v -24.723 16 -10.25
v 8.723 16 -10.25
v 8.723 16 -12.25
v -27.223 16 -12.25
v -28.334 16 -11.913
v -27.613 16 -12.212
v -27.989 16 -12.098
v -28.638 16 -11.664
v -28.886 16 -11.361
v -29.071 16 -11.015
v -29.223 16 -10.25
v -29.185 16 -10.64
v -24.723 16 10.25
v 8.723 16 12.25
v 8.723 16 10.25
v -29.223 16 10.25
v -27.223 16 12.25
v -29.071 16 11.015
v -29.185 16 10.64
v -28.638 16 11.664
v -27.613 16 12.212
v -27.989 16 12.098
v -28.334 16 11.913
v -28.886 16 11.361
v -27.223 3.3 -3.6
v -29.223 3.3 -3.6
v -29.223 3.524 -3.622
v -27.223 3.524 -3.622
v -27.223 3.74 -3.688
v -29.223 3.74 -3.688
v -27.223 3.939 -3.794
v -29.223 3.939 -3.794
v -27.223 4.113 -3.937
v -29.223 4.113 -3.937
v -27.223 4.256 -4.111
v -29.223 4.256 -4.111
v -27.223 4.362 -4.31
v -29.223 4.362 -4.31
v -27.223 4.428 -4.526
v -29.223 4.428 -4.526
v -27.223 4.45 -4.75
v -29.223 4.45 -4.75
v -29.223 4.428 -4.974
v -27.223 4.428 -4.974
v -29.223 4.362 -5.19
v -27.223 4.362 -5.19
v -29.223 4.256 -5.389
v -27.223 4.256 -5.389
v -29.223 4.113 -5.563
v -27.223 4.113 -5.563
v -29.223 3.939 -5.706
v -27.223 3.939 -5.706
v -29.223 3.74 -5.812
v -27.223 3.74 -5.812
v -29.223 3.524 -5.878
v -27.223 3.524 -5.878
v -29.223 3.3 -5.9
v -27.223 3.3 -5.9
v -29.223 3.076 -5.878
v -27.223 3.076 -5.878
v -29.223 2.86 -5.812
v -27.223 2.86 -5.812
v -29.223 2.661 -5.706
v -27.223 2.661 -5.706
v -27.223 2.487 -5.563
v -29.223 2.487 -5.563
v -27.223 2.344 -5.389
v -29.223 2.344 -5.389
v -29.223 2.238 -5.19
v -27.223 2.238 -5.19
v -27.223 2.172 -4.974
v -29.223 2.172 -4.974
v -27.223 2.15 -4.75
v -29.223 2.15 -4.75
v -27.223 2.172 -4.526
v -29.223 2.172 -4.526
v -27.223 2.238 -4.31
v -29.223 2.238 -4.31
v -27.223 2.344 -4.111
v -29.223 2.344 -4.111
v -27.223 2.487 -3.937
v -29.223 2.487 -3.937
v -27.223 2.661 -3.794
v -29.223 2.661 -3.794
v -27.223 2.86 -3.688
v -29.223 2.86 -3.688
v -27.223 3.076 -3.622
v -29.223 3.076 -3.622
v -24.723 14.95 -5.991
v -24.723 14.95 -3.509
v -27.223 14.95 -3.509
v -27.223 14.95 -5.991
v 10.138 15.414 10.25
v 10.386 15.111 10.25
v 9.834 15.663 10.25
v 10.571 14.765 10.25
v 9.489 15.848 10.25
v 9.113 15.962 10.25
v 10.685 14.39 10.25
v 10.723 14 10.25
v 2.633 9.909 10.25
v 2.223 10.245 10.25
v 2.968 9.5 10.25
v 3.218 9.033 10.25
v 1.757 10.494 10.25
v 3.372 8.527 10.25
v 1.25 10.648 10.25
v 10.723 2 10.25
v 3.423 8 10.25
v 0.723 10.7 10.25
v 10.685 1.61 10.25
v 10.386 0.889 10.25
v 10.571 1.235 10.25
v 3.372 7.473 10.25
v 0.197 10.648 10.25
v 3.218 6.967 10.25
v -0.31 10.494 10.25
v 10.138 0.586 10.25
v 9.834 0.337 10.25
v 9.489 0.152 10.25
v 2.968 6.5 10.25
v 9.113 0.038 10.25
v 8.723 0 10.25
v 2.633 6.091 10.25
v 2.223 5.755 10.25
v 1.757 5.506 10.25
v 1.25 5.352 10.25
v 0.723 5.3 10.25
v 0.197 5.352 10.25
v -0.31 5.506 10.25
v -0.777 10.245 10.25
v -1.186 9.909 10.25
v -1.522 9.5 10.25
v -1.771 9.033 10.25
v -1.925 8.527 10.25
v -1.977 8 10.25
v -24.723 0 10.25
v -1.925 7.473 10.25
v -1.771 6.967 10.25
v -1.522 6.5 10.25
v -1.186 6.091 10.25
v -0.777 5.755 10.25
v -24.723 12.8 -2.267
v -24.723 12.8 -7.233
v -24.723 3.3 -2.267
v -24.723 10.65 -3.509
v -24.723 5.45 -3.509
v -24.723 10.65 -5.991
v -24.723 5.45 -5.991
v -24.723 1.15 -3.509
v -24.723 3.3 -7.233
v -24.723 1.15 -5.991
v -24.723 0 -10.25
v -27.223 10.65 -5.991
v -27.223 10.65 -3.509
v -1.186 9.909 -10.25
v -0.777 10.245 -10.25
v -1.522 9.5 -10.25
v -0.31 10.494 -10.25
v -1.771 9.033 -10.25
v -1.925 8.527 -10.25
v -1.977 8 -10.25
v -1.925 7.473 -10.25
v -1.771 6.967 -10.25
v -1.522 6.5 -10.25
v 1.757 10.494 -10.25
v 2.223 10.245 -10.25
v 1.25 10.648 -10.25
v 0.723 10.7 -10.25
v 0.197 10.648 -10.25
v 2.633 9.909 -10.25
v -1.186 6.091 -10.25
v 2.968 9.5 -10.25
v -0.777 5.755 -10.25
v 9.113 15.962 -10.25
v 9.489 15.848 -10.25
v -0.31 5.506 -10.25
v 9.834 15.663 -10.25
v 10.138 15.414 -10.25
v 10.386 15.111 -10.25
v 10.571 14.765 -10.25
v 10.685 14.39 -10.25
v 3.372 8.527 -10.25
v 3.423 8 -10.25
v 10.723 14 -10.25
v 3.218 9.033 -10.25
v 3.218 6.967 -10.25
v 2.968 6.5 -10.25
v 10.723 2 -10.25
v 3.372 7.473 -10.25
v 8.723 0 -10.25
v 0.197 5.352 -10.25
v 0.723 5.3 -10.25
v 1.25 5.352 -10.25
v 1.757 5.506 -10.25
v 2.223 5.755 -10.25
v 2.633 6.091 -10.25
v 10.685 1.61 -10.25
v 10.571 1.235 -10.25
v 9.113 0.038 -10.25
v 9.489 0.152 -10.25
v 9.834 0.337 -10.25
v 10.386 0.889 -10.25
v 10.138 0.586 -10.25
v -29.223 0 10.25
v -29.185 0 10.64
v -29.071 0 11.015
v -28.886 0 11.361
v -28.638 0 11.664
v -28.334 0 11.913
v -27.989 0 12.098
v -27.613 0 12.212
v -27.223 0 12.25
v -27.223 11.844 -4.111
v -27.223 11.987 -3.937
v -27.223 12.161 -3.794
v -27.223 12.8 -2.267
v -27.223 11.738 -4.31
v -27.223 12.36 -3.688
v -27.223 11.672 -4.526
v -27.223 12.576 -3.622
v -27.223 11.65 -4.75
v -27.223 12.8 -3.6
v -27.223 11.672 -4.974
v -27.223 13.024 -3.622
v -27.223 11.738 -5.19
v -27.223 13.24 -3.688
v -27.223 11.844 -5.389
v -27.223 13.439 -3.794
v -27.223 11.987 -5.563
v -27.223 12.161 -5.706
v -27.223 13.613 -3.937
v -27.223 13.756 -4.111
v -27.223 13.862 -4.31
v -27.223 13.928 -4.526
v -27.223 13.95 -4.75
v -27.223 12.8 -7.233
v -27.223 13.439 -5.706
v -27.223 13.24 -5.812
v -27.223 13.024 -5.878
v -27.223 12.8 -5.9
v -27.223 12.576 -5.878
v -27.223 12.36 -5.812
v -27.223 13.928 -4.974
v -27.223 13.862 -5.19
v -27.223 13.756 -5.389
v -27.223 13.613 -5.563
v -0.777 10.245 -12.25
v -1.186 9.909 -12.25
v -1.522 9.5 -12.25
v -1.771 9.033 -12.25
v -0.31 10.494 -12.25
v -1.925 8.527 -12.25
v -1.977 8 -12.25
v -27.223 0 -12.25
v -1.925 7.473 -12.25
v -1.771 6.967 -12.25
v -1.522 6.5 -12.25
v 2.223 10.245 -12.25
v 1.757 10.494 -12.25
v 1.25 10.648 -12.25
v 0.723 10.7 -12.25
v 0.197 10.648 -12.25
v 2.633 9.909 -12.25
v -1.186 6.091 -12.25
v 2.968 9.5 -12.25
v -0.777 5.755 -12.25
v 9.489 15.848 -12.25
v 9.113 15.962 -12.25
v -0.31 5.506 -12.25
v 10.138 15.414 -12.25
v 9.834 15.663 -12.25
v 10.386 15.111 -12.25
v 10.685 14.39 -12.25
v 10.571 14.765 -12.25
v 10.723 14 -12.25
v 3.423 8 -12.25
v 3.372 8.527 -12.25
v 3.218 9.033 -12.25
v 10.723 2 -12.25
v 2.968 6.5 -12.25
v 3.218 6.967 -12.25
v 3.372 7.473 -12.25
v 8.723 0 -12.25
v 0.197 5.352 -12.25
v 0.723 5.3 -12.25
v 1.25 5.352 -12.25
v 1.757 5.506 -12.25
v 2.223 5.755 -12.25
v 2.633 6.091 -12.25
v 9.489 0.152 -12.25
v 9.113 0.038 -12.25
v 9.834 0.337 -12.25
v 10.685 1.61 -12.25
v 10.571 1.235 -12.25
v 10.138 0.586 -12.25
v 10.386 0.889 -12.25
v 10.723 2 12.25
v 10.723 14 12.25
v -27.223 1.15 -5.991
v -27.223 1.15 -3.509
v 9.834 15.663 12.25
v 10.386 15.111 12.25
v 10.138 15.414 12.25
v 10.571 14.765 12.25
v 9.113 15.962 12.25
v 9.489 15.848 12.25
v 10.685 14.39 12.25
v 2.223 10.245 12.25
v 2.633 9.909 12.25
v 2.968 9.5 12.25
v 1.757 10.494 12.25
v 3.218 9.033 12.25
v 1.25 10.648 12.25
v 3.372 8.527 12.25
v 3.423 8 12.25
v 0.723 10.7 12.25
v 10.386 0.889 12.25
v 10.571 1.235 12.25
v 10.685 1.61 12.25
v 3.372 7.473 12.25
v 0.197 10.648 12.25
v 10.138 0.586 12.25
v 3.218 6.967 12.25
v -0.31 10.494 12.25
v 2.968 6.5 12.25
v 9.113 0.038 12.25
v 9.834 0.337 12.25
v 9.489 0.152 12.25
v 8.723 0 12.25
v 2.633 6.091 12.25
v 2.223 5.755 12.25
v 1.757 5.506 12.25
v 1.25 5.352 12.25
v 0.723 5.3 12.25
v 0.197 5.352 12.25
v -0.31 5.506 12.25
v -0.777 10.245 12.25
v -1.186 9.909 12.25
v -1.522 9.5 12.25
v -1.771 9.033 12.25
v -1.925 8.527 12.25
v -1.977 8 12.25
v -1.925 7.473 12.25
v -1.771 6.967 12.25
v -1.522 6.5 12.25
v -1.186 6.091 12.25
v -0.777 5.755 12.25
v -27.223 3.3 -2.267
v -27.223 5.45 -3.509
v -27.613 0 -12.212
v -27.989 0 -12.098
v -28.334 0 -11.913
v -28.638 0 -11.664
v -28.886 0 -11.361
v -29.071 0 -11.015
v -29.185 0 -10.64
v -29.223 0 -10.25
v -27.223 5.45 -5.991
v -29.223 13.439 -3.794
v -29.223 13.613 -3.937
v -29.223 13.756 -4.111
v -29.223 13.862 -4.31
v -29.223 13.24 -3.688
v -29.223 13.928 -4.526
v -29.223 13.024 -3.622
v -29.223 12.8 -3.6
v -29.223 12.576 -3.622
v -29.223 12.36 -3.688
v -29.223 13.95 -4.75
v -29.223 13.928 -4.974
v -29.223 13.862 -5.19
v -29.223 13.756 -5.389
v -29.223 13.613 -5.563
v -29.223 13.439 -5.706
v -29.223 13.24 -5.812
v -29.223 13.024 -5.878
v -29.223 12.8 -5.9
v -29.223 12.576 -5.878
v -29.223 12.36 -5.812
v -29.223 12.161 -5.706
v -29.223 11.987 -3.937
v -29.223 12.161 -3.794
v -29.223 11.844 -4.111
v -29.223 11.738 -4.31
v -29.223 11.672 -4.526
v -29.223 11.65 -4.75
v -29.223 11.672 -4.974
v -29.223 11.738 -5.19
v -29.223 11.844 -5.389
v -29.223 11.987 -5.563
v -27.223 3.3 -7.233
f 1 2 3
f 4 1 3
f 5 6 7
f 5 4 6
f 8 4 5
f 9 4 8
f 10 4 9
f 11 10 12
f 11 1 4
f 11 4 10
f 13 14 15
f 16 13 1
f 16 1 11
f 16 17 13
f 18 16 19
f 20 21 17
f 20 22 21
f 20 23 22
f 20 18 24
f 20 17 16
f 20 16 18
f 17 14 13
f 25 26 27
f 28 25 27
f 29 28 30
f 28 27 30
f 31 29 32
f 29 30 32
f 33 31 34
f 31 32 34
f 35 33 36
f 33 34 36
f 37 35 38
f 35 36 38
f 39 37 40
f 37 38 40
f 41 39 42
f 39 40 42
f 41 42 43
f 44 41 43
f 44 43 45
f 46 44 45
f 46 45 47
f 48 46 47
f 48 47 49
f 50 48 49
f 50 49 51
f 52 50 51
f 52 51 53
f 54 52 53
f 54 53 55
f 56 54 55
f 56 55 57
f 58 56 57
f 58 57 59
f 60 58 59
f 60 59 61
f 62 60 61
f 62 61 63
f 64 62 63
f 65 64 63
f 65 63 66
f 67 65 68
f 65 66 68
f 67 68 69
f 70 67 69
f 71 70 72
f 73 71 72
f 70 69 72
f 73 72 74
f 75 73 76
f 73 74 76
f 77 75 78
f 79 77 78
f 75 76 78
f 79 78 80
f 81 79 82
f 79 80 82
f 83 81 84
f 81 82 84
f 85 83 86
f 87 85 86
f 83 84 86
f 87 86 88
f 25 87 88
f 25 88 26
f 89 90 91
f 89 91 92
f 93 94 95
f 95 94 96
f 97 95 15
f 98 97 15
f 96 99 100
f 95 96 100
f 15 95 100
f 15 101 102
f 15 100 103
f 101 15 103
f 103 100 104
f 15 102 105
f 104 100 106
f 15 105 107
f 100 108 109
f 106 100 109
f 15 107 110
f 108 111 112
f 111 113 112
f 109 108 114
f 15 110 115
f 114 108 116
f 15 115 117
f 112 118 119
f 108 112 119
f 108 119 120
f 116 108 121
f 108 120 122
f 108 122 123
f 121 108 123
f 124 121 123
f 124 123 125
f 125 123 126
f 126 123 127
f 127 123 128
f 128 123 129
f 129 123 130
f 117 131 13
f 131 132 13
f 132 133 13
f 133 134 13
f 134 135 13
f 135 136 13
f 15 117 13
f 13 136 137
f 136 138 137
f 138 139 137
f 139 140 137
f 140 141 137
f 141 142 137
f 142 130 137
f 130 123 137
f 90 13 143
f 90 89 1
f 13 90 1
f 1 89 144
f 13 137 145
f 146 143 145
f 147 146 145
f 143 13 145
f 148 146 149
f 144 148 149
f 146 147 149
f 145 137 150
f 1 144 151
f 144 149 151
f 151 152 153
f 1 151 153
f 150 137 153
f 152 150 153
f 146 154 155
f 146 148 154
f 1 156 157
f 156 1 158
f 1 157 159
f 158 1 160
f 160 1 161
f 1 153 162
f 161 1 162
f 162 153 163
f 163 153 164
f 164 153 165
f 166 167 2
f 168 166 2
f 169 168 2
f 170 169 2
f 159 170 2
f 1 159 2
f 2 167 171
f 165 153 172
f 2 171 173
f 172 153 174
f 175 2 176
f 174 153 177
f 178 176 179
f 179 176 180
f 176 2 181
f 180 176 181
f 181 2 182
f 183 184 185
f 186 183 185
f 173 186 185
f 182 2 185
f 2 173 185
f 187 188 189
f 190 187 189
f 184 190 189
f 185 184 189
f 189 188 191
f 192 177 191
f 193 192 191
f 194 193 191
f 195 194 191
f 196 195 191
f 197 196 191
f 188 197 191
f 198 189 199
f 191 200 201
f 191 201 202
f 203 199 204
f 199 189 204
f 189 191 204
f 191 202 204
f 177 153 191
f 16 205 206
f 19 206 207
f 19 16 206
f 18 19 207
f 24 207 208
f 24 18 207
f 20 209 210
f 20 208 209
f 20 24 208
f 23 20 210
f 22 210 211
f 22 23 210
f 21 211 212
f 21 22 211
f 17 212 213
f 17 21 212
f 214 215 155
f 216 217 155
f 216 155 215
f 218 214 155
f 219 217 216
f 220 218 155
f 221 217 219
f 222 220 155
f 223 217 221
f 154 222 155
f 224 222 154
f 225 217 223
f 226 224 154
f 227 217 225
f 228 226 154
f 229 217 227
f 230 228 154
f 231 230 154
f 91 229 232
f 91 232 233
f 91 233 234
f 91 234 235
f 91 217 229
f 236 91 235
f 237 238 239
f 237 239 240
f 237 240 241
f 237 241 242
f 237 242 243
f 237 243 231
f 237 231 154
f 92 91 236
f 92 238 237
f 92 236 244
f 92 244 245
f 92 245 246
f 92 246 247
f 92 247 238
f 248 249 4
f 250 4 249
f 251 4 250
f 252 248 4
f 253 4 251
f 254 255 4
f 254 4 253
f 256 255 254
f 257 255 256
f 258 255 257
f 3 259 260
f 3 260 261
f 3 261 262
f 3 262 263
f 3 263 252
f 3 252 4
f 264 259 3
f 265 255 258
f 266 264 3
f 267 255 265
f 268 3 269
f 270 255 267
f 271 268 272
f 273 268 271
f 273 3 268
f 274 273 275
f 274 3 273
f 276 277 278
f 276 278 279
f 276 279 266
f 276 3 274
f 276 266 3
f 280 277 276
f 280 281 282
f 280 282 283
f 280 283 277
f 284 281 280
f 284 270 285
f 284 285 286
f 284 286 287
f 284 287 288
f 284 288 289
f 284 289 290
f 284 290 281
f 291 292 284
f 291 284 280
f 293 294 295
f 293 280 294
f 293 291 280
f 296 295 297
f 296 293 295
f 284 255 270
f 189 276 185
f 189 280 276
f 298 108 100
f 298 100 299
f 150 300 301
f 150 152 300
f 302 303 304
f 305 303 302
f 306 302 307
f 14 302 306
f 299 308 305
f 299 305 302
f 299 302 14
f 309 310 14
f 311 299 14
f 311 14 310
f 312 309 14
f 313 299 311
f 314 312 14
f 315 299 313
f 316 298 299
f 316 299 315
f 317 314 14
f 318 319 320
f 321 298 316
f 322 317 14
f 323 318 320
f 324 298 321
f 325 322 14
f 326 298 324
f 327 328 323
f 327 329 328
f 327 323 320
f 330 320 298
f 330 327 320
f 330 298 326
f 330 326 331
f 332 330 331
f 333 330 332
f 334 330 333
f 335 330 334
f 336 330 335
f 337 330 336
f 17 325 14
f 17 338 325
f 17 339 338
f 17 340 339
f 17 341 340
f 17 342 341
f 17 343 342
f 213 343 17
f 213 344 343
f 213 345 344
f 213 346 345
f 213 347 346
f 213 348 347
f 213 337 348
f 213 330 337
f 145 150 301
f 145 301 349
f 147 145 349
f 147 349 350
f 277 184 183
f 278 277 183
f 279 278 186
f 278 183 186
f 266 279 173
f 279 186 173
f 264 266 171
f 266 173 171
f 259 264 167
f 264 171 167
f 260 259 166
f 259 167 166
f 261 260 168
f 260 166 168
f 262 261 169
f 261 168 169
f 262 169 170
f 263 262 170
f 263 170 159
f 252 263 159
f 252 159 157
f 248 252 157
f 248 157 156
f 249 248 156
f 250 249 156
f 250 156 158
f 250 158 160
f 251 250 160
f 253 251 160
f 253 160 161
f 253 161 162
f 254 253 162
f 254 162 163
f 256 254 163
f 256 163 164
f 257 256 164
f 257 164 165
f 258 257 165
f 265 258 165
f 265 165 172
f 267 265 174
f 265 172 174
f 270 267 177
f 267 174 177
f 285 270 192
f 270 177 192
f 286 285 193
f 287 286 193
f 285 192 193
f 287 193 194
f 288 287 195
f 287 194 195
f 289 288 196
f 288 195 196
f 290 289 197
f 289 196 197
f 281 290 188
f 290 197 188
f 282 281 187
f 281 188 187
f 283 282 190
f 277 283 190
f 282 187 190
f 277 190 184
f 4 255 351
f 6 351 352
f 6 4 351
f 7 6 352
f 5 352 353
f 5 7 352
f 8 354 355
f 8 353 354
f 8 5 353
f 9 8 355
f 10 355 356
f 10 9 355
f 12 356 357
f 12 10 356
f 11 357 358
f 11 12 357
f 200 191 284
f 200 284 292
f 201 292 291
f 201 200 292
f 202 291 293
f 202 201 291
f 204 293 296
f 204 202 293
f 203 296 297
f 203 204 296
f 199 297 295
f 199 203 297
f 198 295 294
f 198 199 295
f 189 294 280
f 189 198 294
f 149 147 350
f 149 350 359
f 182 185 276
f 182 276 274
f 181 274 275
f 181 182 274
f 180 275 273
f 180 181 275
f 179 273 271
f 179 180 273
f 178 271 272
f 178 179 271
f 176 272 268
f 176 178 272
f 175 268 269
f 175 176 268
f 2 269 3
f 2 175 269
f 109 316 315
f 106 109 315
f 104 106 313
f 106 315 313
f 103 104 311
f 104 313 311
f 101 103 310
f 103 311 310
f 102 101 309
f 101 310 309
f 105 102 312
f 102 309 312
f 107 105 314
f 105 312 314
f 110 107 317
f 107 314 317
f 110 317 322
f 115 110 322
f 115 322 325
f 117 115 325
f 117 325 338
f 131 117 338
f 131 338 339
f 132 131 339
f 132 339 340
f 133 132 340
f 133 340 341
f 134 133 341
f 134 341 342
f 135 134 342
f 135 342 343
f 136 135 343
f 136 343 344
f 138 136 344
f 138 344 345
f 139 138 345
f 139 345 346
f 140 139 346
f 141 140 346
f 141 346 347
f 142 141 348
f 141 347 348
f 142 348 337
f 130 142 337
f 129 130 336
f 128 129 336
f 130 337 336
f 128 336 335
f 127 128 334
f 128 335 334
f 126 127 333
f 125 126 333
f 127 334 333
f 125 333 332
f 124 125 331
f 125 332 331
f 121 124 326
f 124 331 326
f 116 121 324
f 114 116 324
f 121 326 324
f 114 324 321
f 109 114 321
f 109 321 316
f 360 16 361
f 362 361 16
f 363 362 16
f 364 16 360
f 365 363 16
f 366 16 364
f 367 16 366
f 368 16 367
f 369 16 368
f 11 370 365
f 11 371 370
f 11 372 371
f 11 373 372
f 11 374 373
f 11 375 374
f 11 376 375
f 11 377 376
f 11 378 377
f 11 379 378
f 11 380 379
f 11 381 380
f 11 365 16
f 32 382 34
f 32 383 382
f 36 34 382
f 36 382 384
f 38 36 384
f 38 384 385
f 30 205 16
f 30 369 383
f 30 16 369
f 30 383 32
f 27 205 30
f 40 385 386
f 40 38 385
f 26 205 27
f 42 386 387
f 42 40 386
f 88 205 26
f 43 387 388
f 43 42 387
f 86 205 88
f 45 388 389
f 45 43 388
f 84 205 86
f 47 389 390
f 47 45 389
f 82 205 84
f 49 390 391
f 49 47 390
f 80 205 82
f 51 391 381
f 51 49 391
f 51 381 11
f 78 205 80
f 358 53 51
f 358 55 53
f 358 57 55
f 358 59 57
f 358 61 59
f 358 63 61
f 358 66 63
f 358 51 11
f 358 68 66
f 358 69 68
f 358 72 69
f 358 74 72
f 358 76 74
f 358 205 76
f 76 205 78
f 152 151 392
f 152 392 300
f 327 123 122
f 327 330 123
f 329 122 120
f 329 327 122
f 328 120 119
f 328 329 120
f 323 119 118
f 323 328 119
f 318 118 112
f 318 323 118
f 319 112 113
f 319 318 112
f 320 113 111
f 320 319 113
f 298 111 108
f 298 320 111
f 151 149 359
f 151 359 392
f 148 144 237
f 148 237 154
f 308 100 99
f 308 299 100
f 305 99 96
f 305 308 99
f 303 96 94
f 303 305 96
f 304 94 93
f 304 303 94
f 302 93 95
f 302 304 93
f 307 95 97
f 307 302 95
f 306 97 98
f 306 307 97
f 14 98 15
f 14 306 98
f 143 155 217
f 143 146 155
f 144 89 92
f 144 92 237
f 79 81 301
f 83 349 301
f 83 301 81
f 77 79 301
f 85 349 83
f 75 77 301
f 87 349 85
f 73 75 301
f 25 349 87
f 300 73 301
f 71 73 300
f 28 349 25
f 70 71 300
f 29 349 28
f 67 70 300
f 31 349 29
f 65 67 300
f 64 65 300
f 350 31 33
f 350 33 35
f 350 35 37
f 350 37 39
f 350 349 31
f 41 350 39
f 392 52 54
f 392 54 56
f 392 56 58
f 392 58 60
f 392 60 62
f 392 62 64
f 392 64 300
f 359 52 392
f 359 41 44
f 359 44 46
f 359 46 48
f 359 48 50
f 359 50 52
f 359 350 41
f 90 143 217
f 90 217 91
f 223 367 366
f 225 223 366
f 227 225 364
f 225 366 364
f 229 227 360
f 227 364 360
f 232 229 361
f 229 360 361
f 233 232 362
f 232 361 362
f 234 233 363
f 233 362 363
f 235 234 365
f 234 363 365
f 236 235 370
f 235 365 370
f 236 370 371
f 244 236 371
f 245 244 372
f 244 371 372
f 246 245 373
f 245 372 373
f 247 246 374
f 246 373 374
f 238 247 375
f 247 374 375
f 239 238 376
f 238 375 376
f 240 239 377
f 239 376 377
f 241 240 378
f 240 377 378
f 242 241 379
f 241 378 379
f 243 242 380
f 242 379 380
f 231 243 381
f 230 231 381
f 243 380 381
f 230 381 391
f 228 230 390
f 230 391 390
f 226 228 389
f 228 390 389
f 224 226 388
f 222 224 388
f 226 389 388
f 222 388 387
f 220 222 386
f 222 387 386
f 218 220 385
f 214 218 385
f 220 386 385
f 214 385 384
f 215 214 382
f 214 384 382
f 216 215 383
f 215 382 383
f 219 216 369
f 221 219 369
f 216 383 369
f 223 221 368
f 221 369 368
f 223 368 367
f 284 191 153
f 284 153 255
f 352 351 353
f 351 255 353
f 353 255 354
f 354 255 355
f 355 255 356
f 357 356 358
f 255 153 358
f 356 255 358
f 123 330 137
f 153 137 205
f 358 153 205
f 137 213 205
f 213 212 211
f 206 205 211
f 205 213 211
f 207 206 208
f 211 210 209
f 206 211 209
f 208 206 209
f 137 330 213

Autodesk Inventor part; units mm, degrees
ref_plane "YZ Plane" through (0, 0, 0) normal (1, 0, 0) x (0, 1, 0)
ref_plane "XZ Plane" through (0, 0, 0) normal (0, 1, 0) x (-1, 0, 0)
ref_plane "XY Plane" through (0, 0, 0) normal (0, 0, 1) x (1, 0, 0)
sketch "Boceto1" plane through (0, 0, 0) normal (0, 1, 0) x (-1, 0, 0)
  line L0 (-10.7233, 10.25) -> (10.7233, 10.25)
  line L1 (10.7233, 10.25) -> (10.7233, -10.25)
  line L2 (10.7233, -10.25) -> (-10.7233, -10.25)
  line L3 (-10.7233, -10.25) -> (-10.7233, 10.25)
  line L4 (-10.7233, 10.25) -> (10.7233, -10.25) construction
  line L5 (10.7233, 10.25) -> (-10.7233, -10.25) construction
  line L6 (-10.7233, 12.25) -> (10.7233, 12.25)
  line L7 (10.7233, 12.25) -> (10.7233, -12.25)
  line L8 (10.7233, -12.25) -> (-10.7233, -12.25)
  line L9 (-10.7233, -12.25) -> (-10.7233, 12.25)
  line L10 (-10.7233, 12.25) -> (10.7233, -12.25) construction
  line L11 (10.7233, 12.25) -> (-10.7233, -12.25) construction
  line L12 (10.7233, 12.25) -> (24.7233, 12.25)
  line L13 (24.7233, 12.25) -> (24.7233, -12.25)
  line L14 (24.7233, -12.25) -> (10.7233, -12.25)
  line L15 (10.7233, -12.25) -> (10.7233, 12.25)
  line L16 (10.7233, 10.25) -> (24.7233, 10.25)
  line L17 (24.7233, 10.25) -> (24.7233, -10.25)
  line L18 (24.7233, -10.25) -> (10.7233, -10.25)
  line L19 (10.7233, -10.25) -> (10.7233, 10.25)
  line L20 (24.7233, 12.25) -> (29.2233, 12.25)
  line L21 (29.2233, 12.25) -> (29.2233, -12.25)
  line L22 (29.2233, -12.25) -> (24.7233, -12.25)
  line L23 (24.7233, -12.25) -> (24.7233, 12.25)
  point P0 (0, 0)
  point P1 (24.7233, 10.25)
  point P2 (-10.7233, -10.25)
  dimension "d0" = 20.5
  dimension "d1" = 2
  dimension "d2" = 14
  dimension "d3" = 18.5
extrude "Extrusión1" add sketch "Boceto1" along normal blind 16 contours L9 L6 L7 L0 | L7 L12 L13 L16 | L2 L7 L8 L9 | L18 L13 L14 L7 | L13 L20 L21 L22
sketch "Boceto2" plane through (-29.2233, 0, -12.25) normal (-1, 0, 0) x (0, 0, 1)
  circle A0 centre (7.5, 3.3) radius 1.15
  circle A1 centre (7.5, 12.8) radius 1.15
  line L0 (0, 0) -> (24.5, 0) projected
  line L1 (0, 0) -> (0, 16) projected
  point P0 (12.25, 0)
  dimension "d6" = 2.3
  dimension "d7" = 3.3
  dimension "d8" = 9.5
  dimension "d9" = 7.5
extrude "Extrusión2" cut sketch "Boceto2" against normal through all
sketch "Boceto3" plane through (-24.7233, 0, 10.25) normal (1, 0, 0) x (0, 0, -1)
  circle A0 centre (15, 12.8) radius 1.15 projected
  circle A1 centre (15, 12.8) radius 2.15
  circle A2 centre (15, 3.3) radius 1.15 projected
  circle A3 centre (15, 3.3) radius 2.15
  line L0 (17.4826, 12.8) -> (16.2413, 10.65)
  line L1 (16.2413, 10.65) -> (13.7587, 10.65)
  line L2 (13.7587, 10.65) -> (12.5174, 12.8)
  line L3 (12.5174, 12.8) -> (13.7587, 14.95)
  line L4 (13.7587, 14.95) -> (16.2413, 14.95)
  line L5 (16.2413, 14.95) -> (17.4826, 12.8)
  line L6 (17.4826, 3.3) -> (16.2413, 1.15)
  line L7 (16.2413, 1.15) -> (13.7587, 1.15)
  line L8 (13.7587, 1.15) -> (12.5174, 3.3)
  line L9 (12.5174, 3.3) -> (13.7587, 5.45)
  line L10 (13.7587, 5.45) -> (16.2413, 5.45)
  line L11 (16.2413, 5.45) -> (17.4826, 3.3)
  point P0 (10.25, 0)
  dimension "d12" = 4.3
extrude "Extrusión3" cut sketch "Boceto3" against normal blind 2.5 contours A0 | A1 | A1 L5 L0 | A1 L4 L5 | L0 L1 A1 | A1 L3 L4 | L1 L2 A1 | A1 L2 L3 | A2 | A3 | A3 L11 L6 | A3 L10 L11 | L6 L7 A3 | A3 L9 L10 | L7 L8 A3 | A3 L8 L9
sketch "Boceto4" plane through (-29.2233, 0, 12.25) normal (0, 0, 1) x (1, 0, 0)
  circle A0 centre (29.9467, 8) radius 2.7
  line L0 (39.9467, 0) -> (39.9467, 16) projected
  line L1 (0, 0) -> (39.9467, 0) projected
  point P0 (29.2233, 0)
  dimension "d15" = 10
  dimension "d16" = 8
  dimension "d17" = 5.4
extrude "Extrusión4" cut sketch "Boceto4" against normal through all
fillet "Empalme1" radius 2 6 edges at (10.7233, 0, 11.25) (10.7233, 16, 11.25) (10.7233, 16, -11.25) (10.7233, 0, -11.25) (-29.2233, 8, 12.25) (-29.2233, 8, -12.25)
properties part number "gfdsgfd"
